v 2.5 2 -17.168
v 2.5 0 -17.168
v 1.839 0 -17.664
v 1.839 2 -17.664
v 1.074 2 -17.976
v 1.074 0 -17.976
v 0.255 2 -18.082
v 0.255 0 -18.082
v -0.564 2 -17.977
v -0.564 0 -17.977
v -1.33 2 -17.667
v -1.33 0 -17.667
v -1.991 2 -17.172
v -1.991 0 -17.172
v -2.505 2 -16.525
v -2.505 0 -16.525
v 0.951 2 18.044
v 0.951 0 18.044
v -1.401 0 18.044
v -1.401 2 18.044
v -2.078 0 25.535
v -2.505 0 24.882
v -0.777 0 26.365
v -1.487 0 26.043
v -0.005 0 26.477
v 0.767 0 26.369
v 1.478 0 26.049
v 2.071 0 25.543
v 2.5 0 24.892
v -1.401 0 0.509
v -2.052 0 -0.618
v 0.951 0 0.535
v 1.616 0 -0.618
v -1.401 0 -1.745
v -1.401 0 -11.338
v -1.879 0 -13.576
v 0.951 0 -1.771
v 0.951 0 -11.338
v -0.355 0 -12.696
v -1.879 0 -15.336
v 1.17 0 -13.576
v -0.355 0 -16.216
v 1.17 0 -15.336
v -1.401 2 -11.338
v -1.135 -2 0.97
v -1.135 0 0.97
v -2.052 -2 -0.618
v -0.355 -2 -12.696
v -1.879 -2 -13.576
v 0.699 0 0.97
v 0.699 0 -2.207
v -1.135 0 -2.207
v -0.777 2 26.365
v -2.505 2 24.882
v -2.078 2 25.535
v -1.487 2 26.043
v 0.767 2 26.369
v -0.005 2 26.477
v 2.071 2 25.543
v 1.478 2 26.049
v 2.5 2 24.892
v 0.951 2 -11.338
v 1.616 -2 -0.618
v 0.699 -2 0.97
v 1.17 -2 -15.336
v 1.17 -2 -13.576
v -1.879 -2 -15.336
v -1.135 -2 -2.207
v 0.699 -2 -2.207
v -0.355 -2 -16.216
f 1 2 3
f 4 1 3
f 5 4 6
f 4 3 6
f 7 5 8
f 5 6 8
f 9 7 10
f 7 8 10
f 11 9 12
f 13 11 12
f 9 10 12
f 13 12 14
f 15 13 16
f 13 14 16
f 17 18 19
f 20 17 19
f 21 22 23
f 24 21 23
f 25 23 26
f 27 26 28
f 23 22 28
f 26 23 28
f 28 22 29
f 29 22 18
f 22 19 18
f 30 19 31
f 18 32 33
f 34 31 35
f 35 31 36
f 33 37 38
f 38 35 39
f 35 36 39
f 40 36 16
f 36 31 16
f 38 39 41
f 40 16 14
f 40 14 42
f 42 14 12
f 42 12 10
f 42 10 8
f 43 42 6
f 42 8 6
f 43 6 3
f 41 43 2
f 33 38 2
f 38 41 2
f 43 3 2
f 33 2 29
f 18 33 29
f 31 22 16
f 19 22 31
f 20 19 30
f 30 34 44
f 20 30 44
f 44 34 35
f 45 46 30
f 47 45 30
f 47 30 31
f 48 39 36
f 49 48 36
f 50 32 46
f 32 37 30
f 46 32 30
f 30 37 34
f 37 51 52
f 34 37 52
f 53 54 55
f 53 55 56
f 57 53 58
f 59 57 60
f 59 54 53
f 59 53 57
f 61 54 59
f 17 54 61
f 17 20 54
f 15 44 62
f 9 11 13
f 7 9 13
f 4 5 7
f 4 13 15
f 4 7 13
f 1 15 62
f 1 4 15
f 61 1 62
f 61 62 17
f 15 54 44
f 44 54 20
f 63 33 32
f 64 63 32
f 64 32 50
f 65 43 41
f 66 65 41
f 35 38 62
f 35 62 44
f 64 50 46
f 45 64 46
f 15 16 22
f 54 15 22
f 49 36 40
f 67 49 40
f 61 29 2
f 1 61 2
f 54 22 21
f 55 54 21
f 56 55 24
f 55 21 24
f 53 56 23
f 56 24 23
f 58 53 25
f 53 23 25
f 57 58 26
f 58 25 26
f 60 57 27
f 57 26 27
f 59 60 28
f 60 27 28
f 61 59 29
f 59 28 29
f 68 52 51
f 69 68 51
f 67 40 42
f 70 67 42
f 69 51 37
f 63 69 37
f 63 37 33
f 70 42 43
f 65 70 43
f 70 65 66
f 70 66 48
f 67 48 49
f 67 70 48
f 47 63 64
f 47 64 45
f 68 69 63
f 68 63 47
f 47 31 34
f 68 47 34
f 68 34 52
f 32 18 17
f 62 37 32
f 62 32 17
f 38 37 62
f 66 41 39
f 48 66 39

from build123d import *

# Parameters (mm, degrees)
BOSS_EXTRUDE1_DEPTH = 2
SKETCH3_W           = 2.352038348
SKETCH3_H           = 29.381645189
CUT_EXTRUDE1_DEPTH  = 10
BOSS_EXTRUDE6_DEPTH = 2
BOSS_EXTRUDE9_DEPTH = 2


with BuildPart() as part:
    # Sketch1 → Boss-Extrude1 (new body)
    with BuildSketch(Plane(origin=(0, 0, 0), x_dir=(1, 0, 0), z_dir=(0, 1, 0))):
        with BuildLine():
            Line((2.5, -24.892218109), (2.5, 17.168276032))
            ThreePointArc((2.5, 17.168276032), (-0.157753681, 18.055867427), (-2.504670814, 16.525033312))
            Line((-2.504670814, 16.525033312), (-2.504670814, -24.882267467))
            ThreePointArc((-2.504670814, -24.882267467), (-0.005496175, -26.4769499), (2.5, -24.892218109))
        make_face()
    extrude(amount=BOSS_EXTRUDE1_DEPTH)

    # Sketch3 → Cut-Extrude1 (cut)
    with BuildSketch(Plane(origin=(0, 0, 0), x_dir=(-1, 0, 0), z_dir=(0, -1, 0))):
        with Locations((0.225062248, -3.353285415)):
            Rectangle(SKETCH3_W, SKETCH3_H)
    extrude(amount=-CUT_EXTRUDE1_DEPTH, mode=Mode.SUBTRACT)

    # Sketch8 → Boss-Extrude6 (add)
    with BuildSketch(Plane(origin=(0, 0, 0), x_dir=(-1, 0, 0), z_dir=(0, -1, 0))):
        Polygon((0.354887885, 16.216439576), (-1.169599114, 15.336276597), (-1.169599114, 13.575950638), (0.354887885, 12.695787659), (1.879374884, 13.575950638), (1.879374884, 15.336276597), align=None)
    extrude(amount=BOSS_EXTRUDE6_DEPTH)

    # Sketch9 → Boss-Extrude9 (add)
    with BuildSketch(Plane(origin=(0, 0, 0), x_dir=(-1, 0, 0), z_dir=(0, -1, 0))):
        Polygon((-1.616477648, 0.618051223), (-0.699382455, -0.970404247), (1.13480793, -0.970404247), (2.051903123, 0.618051223), (1.13480793, 2.206506692), (-0.699382455, 2.206506692), align=None)
    extrude(amount=BOSS_EXTRUDE9_DEPTH)


solid = part.part
